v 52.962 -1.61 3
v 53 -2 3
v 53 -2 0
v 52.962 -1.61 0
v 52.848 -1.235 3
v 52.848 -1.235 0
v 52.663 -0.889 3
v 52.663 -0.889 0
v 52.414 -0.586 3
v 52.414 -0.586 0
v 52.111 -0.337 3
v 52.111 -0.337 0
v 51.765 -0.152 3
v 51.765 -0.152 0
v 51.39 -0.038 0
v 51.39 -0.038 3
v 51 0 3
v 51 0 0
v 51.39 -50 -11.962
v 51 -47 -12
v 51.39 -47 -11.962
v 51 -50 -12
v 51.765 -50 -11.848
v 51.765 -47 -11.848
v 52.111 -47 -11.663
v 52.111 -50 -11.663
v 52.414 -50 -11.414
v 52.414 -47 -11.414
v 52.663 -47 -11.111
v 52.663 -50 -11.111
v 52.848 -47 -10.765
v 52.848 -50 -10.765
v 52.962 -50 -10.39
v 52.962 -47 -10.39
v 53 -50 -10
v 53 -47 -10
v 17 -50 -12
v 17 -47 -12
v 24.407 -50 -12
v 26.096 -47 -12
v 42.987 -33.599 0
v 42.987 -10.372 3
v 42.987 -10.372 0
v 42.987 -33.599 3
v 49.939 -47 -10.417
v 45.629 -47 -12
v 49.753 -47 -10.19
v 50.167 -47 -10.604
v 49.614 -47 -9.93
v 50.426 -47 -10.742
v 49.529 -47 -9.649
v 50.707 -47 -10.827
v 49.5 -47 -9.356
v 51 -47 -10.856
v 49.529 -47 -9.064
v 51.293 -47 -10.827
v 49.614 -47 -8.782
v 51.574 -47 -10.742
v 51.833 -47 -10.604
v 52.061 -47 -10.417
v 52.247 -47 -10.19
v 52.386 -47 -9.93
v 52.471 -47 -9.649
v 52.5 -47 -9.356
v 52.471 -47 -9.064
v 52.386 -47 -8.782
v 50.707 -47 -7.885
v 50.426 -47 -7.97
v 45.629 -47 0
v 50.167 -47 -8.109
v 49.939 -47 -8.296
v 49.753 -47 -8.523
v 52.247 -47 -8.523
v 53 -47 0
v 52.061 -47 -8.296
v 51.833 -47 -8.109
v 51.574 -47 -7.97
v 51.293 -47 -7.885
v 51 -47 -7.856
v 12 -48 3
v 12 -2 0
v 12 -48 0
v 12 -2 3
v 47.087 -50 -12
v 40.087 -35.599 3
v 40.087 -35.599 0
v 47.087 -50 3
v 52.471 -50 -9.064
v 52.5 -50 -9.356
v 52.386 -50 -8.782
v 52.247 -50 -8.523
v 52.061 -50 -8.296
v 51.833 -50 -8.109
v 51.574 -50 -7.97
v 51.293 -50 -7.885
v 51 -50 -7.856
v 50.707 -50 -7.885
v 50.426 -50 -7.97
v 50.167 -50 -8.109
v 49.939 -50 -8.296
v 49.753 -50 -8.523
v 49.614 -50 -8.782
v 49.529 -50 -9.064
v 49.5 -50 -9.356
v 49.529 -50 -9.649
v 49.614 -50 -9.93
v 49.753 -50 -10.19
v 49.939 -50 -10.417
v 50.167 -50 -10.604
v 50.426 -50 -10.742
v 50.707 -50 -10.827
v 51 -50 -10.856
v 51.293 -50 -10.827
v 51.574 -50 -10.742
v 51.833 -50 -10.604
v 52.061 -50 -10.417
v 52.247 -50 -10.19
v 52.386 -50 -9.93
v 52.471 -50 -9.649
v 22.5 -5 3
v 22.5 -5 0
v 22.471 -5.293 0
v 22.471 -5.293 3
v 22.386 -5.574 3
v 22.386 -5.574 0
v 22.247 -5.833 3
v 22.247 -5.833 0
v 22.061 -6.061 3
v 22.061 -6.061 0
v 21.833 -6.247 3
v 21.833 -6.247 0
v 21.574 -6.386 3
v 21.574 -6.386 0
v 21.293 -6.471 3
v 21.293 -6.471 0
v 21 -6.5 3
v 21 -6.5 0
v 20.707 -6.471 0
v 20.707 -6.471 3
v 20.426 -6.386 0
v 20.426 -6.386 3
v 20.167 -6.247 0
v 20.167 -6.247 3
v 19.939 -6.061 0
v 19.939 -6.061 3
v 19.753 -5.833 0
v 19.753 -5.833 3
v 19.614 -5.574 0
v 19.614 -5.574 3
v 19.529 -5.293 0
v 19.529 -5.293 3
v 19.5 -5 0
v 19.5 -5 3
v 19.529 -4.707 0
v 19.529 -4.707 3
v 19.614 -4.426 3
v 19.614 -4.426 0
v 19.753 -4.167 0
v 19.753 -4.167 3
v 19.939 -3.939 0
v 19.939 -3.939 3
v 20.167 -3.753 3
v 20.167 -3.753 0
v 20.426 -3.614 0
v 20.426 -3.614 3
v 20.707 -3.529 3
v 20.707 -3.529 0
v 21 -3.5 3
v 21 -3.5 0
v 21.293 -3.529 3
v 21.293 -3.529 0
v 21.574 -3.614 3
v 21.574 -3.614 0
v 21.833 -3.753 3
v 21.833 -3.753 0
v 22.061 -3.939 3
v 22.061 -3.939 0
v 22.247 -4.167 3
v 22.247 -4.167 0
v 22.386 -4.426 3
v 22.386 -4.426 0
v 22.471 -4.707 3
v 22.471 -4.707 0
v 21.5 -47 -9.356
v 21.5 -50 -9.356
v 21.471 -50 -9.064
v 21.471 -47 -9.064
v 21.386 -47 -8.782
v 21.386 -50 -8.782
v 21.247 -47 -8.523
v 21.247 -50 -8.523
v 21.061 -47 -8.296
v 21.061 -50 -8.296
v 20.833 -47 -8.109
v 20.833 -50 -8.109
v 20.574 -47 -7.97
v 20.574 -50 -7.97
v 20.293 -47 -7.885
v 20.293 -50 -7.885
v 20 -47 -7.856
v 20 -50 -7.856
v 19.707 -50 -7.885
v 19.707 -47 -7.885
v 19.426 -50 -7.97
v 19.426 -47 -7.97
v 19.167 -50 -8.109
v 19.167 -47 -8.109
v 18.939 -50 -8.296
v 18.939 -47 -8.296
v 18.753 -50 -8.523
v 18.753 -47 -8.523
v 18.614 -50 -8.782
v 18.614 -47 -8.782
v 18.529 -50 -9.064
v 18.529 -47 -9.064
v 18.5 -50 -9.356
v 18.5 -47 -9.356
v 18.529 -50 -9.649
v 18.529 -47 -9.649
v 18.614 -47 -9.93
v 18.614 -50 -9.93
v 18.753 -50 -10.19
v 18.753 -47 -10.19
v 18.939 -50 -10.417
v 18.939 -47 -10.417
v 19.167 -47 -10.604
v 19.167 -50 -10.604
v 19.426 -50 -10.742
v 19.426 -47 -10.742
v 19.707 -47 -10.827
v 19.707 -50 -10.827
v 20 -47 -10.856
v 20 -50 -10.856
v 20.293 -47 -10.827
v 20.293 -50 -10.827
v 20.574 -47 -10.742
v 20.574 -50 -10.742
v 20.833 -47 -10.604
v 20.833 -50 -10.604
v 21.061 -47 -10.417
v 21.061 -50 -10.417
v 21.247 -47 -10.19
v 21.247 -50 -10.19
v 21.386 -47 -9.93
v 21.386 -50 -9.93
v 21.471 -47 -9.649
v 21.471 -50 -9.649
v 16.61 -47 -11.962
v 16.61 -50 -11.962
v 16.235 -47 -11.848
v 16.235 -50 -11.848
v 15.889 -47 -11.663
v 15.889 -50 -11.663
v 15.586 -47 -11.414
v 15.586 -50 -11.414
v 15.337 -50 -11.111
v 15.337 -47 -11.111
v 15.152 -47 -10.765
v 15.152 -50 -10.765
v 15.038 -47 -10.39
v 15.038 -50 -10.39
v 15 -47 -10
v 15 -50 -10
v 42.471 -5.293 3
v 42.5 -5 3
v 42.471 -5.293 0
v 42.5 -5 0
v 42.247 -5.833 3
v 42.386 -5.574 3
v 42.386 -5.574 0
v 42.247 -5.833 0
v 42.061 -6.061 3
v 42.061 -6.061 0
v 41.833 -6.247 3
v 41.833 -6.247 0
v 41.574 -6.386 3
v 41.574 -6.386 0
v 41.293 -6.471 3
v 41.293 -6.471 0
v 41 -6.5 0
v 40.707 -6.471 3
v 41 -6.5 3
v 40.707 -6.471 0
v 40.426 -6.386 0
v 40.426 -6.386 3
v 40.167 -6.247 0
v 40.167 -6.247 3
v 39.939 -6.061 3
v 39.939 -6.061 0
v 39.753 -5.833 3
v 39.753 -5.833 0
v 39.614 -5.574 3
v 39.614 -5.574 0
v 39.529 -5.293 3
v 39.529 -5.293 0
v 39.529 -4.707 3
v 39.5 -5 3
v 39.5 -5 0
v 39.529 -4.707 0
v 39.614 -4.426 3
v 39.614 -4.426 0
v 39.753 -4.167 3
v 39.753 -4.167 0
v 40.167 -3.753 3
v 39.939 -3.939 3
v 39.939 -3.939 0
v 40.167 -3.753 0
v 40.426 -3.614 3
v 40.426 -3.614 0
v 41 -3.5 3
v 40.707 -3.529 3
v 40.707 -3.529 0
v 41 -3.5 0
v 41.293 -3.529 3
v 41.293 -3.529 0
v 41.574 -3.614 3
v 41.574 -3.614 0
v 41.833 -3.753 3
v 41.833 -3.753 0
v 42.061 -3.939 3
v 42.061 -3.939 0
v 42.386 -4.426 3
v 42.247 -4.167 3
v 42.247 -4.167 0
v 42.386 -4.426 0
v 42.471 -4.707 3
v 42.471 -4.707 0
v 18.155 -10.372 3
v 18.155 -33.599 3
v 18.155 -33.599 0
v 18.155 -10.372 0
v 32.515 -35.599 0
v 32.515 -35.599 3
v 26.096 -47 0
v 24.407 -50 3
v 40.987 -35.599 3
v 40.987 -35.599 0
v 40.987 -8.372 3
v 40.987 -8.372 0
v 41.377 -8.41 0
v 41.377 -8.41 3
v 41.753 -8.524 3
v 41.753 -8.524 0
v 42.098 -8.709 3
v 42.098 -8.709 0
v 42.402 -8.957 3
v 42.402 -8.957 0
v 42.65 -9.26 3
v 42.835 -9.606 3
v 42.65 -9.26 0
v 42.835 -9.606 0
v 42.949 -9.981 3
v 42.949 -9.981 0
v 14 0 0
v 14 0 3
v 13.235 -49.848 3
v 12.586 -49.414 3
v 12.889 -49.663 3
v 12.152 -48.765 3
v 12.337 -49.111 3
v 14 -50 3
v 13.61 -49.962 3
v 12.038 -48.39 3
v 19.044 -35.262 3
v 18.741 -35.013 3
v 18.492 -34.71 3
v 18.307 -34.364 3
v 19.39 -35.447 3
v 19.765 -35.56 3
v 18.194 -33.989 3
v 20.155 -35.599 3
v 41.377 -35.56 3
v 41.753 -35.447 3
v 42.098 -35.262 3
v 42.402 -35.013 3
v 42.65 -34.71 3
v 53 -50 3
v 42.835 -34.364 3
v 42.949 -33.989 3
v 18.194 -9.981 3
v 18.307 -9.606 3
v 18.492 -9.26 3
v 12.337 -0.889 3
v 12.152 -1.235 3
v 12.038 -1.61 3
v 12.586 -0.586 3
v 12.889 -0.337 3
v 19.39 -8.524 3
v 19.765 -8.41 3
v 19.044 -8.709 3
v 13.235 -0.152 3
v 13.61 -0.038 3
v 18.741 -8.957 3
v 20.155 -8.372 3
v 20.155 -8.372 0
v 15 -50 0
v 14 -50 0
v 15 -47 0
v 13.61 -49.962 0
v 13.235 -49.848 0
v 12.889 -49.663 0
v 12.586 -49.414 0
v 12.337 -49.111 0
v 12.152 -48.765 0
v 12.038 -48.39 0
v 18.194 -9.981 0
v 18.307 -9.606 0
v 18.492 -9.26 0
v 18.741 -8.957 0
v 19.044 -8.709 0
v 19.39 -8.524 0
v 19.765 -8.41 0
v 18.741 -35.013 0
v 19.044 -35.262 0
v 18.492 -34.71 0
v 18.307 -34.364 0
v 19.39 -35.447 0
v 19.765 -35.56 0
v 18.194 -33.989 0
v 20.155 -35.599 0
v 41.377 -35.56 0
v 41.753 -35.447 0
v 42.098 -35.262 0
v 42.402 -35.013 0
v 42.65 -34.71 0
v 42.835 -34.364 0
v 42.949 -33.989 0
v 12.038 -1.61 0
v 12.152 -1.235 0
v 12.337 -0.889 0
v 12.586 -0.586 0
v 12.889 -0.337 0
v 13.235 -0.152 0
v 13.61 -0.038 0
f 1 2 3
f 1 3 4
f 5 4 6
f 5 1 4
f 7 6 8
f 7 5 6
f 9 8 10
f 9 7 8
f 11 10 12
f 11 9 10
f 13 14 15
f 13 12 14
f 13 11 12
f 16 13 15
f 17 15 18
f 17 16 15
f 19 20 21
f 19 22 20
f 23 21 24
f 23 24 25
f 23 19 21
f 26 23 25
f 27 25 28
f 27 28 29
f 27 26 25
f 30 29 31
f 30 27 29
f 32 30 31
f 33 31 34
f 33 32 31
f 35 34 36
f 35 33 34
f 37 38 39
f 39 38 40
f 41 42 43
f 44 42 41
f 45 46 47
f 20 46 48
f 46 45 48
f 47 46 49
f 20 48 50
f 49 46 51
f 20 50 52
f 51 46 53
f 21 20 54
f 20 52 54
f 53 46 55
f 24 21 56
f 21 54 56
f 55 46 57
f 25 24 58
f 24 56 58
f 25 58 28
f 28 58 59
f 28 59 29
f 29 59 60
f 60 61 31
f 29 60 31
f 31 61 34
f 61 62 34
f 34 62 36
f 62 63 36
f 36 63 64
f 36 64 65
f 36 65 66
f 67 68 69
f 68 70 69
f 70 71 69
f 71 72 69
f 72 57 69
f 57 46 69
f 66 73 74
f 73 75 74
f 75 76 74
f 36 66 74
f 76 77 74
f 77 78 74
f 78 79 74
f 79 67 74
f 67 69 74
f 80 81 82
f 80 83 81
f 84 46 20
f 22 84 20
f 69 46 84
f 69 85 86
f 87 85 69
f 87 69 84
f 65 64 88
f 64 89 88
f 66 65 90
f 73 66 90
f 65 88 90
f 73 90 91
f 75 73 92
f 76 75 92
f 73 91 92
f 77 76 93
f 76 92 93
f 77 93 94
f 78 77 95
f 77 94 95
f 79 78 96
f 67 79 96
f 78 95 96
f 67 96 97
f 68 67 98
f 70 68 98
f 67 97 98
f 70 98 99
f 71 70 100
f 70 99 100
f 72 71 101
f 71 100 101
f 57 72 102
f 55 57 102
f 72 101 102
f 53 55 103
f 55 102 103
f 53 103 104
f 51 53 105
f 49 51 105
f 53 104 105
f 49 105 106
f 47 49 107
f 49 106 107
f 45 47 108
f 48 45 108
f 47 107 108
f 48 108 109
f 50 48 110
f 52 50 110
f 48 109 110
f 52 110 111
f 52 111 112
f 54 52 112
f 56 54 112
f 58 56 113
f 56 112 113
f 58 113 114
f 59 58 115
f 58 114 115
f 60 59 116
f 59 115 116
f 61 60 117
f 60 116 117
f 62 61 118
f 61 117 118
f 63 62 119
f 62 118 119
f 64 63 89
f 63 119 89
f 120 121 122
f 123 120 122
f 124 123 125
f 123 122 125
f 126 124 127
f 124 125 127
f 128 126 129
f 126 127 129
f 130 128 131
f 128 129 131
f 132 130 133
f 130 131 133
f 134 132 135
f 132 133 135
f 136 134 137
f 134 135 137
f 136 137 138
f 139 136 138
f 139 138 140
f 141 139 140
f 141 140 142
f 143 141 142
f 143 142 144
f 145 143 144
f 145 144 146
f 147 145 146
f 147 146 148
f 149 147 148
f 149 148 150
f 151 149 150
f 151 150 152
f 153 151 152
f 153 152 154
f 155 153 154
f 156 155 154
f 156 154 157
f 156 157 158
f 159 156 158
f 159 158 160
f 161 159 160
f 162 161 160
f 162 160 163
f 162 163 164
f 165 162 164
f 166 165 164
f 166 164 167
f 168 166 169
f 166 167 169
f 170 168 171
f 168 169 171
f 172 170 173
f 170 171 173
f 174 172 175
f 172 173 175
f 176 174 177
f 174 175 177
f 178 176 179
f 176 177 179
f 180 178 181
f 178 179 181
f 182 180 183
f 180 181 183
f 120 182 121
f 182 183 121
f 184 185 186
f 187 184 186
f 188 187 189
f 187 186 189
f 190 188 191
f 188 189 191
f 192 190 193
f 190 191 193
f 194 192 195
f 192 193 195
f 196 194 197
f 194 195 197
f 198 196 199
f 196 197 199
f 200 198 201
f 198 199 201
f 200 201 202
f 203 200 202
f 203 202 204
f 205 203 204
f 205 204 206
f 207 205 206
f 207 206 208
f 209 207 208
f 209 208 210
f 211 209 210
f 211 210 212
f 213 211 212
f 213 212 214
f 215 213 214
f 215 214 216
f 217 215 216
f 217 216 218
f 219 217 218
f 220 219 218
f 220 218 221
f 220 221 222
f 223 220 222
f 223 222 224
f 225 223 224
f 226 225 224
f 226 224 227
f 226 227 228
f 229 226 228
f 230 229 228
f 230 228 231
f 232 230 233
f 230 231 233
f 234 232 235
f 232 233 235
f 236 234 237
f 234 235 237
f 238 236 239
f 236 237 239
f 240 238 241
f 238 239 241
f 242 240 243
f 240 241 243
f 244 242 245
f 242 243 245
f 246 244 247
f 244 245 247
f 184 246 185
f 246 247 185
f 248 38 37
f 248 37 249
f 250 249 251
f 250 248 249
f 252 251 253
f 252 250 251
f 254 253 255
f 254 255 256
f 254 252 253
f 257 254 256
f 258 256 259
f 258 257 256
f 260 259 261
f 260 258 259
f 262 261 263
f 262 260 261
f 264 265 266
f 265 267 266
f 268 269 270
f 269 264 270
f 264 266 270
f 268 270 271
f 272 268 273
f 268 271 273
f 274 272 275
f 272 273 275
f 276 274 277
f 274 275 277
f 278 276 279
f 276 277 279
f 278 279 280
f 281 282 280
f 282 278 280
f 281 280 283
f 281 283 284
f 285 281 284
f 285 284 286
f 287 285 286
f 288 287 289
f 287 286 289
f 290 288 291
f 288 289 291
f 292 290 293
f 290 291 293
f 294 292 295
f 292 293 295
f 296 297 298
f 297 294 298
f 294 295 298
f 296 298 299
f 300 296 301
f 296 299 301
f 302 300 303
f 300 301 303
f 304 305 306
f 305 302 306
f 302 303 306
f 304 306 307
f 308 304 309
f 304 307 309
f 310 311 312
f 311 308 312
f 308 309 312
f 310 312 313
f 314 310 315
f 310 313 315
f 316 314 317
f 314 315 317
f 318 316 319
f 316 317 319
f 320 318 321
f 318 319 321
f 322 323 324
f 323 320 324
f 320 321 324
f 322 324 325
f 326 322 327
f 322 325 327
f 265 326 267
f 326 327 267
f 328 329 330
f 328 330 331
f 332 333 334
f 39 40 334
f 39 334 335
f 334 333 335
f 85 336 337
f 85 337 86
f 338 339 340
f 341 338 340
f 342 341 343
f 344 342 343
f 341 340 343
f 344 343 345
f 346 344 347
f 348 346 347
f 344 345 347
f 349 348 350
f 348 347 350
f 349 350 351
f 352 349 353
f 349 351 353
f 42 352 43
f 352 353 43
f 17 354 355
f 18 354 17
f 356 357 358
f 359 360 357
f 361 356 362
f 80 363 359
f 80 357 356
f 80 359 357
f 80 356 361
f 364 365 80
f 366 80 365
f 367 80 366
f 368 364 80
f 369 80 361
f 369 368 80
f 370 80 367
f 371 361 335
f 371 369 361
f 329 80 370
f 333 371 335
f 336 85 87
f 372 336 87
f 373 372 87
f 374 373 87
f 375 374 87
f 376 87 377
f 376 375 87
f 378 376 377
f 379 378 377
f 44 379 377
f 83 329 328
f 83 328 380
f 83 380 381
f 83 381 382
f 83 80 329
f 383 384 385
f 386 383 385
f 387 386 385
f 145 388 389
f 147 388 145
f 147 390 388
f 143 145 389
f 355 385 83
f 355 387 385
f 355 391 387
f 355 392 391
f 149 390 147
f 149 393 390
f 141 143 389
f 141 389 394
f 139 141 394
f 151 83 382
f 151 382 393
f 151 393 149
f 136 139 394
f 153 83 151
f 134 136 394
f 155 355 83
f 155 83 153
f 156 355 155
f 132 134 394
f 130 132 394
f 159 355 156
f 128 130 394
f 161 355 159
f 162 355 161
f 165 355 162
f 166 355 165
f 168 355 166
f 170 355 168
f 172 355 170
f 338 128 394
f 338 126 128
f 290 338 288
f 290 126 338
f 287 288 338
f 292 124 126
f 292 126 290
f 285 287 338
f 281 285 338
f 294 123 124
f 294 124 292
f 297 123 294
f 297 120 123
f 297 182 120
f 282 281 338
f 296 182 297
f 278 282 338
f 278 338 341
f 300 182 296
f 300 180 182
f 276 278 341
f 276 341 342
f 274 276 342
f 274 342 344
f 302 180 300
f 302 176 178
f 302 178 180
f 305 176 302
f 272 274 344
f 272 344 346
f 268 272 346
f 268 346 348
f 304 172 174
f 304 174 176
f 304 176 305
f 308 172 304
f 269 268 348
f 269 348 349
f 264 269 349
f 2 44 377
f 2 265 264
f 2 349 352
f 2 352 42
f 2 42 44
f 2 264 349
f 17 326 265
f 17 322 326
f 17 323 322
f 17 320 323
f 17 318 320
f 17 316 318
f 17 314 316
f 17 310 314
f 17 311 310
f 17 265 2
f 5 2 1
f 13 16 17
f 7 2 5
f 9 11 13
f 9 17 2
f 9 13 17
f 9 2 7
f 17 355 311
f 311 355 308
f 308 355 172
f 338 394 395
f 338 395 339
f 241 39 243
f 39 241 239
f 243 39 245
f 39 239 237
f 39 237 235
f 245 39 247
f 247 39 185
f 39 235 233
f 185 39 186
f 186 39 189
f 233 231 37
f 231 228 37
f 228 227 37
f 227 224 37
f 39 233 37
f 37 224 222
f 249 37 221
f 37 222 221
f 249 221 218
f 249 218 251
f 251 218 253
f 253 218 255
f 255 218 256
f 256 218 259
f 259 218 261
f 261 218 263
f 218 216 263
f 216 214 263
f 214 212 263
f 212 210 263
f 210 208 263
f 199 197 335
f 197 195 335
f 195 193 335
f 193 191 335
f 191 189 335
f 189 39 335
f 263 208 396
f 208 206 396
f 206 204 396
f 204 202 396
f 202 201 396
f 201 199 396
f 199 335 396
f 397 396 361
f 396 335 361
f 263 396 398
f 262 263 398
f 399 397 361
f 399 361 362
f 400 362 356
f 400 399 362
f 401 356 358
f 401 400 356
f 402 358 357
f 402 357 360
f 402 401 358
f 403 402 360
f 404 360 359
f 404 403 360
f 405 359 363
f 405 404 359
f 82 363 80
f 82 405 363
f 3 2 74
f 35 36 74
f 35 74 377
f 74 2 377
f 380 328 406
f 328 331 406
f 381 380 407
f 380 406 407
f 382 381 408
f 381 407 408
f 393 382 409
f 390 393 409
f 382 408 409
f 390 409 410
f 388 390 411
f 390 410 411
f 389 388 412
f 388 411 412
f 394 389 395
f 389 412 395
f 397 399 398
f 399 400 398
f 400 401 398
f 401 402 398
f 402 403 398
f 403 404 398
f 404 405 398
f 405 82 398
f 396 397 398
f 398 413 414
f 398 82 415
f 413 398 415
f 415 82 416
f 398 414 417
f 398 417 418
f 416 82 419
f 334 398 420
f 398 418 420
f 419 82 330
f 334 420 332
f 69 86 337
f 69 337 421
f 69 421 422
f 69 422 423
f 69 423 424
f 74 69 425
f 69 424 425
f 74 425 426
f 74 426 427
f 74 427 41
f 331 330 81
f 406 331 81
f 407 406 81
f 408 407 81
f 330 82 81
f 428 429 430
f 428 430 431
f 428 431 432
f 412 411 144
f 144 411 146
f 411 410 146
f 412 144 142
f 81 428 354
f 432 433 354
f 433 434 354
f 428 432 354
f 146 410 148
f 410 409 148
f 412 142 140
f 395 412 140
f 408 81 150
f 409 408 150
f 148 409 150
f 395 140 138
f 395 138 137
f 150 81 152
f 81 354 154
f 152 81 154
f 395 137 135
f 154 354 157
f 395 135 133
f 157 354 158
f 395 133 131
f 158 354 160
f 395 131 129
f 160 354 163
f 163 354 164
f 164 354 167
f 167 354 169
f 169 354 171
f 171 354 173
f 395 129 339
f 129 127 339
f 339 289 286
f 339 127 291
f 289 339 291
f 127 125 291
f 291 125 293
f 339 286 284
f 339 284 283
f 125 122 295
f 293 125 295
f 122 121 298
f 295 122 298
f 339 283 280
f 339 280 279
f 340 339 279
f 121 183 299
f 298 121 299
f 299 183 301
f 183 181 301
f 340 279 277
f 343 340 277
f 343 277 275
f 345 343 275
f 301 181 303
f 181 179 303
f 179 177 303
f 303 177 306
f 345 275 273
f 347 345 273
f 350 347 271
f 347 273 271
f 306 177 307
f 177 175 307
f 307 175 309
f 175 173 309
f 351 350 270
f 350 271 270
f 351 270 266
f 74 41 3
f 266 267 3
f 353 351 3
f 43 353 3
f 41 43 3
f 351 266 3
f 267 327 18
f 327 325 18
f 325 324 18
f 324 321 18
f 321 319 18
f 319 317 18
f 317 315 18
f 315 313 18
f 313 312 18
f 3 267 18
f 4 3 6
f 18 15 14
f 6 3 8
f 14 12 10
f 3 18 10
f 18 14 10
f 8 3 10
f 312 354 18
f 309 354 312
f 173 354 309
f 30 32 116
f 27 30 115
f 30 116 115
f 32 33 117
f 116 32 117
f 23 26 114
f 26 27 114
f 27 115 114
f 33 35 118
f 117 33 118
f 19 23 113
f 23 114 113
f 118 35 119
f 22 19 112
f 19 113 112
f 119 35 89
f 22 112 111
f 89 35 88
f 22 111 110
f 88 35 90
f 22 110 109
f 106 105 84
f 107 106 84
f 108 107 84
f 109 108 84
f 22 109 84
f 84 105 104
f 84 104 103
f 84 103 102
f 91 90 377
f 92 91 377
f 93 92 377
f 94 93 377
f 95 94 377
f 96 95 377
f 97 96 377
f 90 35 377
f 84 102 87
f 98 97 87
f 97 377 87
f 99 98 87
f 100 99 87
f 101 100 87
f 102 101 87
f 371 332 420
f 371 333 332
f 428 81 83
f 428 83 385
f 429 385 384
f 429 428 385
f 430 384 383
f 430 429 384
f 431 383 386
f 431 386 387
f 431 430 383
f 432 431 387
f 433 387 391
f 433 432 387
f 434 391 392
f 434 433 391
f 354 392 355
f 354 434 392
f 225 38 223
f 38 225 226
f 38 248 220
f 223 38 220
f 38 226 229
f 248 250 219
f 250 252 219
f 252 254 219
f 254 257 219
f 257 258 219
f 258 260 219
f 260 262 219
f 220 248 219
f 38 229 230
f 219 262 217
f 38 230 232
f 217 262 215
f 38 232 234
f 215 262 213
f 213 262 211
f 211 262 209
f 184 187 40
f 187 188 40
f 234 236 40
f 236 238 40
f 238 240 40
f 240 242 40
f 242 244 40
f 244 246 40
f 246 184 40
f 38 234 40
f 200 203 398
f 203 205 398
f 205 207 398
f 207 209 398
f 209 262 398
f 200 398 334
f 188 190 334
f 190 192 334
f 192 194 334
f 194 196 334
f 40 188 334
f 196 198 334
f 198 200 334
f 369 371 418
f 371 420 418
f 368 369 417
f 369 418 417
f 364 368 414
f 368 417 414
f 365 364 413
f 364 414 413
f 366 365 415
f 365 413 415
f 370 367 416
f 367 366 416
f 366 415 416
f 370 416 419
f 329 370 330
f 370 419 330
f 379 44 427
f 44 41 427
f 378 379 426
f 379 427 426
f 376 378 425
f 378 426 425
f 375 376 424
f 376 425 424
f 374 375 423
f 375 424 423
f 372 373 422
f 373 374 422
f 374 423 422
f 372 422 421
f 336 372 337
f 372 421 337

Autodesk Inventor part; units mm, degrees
ref_plane "YZ Plane" through (0, 0, 0) normal (1, 0, 0) x (0, 1, 0)
ref_plane "XZ Plane" through (0, 0, 0) normal (0, 1, 0) x (-1, 0, 0)
ref_plane "XY Plane" through (0, 0, 0) normal (0, 0, 1) x (1, 0, 0)
sketch "Sketch1" plane through (0, 0, 0) normal (0, 0, 1) x (1, 0, 0)
  line L0 (0, 0) -> (53, 0)
  line L1 (53, 0) -> (53, -50)
  line L2 (53, -50) -> (0, -50)
  line L3 (0, -50) -> (0, 0)
  line L4 (41, 0) -> (41, 6.0159) construction
  line L5 (41, 6.0159) -> (41, -25.0024) construction
  circle A0 centre (41, -5) radius 1.5
  line L6 (41, 3.3654) -> (9, 3.3654) construction
  line L7 (9, 3.3654) -> (9, -23.8563) construction
  line L8 (41, -5) -> (7.1054, -5) construction
  circle A1 centre (9, -5) radius 1.5
  line L9 (41, -9) -> (21, -9) construction
  line L10 (21, -9) -> (21, -3) construction
  circle A2 centre (21, -5) radius 1.5
  dimension "d0" = 53
  dimension "d1" = 50
  dimension "d2" = 3
  dimension "d3" = 32
  dimension "d4" = 3
  dimension "d87" = 20
  dimension "d88" = 3
extrude "Extrusion1" add sketch "Sketch1" along normal blind 3 contours L0 L1 L2 L3 | A2
sketch "Sketch2" plane through (0, 0, 3) normal (0, 0, 1) x (1, 0, 0)
  line L0 (53, -50) -> (15, -50)
  line L1 (15, -50) -> (15, -47)
  line L2 (15, -47) -> (53, -47)
  line L3 (53, -47) -> (53, -50)
  dimension "d7" = 38
  dimension "d8" = 3
extrude "Extrusion2" add sketch "Sketch2" against normal blind 15
fillet "Fillet3" radius 2 1 edges at (53, -48.5, -12)
fillet "Fillet6" radius 2 1 edges at (15, -48.5, -12)
sketch "Sketch5" plane through (0, 0, 3) normal (0, 0, 1) x (1, 0, 0)
  line L0 (18.1552, -8.3715) -> (42.9873, -8.3715)
  line L1 (42.9873, -8.3715) -> (42.9873, -35.5989)
  line L2 (42.9873, -35.5989) -> (18.1552, -35.5989)
  line L3 (18.1552, -35.5989) -> (18.1552, -8.3715)
extrude "Extrusion4" cut sketch "Sketch5" against normal through all
fillet "Fillet8" radius 2 1 edges at (18.1552, -8.3715, 1.5)
fillet "Fillet9" radius 2 1 edges at (42.9873, -8.3715, 1.5)
fillet "Fillet10" radius 2 1 edges at (18.1552, -35.5989, 1.5)
fillet "Fillet12" radius 2 1 edges at (42.9873, -35.5989, 1.5)
fillet "Fillet13" radius 2 1 edges at (0, 0, 1.5)
fillet "Fillet14" radius 2 1 edges at (53, 0, 1.5)
sketch "Sketch6" plane through (0, -50, 3) normal (0, -1, 0) x (1, 0, 0)
  line L0 (51, -15) -> (17, -15) projected
  line L1 (0, 0) -> (53, 0) projected
  line L2 (53, 0) -> (51, 0) construction
  line L3 (51, 2) -> (51, -15) construction
  line L4 (54, -12.3563) -> (12.4146, -12.3563) construction
  line L5 (51, -7.4819) -> (20, -7.4819) construction
  line L6 (20, -7.4819) -> (20, -11) construction
  circle A0 centre (20, -12.3563) radius 1.5
  circle A1 centre (51, -12.3563) radius 1.5
  dimension "d60" = 31
  dimension "d61" = 3
  dimension "d64" = 3
extrude "Extrusion5" cut sketch "Sketch6" against normal through all contours A0
extrude "Extrusion6" cut sketch "Sketch6" against normal through all contours A1
sketch "Sketch7" plane through (0, 0, 3) normal (0, 0, 1) x (1, 0, 0)
  line L0 (40.9873, -35.5989) -> (20.1552, -35.5989) projected
  line L1 (0, -50) -> (53, -50) projected
  line L2 (32.5151, -35.5989) -> (24.407, -50)
  line L3 (40.0869, -35.5989) -> (47.0869, -50)
  point P0 (0, 0)
extrude "Extrusion7" cut sketch "Sketch7" against normal through all
sketch "Sketch8" plane through (0, 0, 3) normal (0, 0, 1) x (1, 0, 0)
  line L0 (0, -50) -> (24.407, -50) projected
  circle A0 centre (9, -5) radius 1.5 projected
  line L1 (0, 0) -> (12, 0)
  line L2 (12, 0) -> (12, -50)
  line L3 (12, -50) -> (0, -50)
  line L4 (0, -50) -> (0, 0)
extrude "Extrusion8" cut sketch "Sketch8" against normal through all
fillet "Fillet15" radius 2 1 edges at (12, -50, 1.5)
fillet "Fillet16" radius 2 1 edges at (12, 0, 1.5)
hole "Hole4" at (20, -50, -9.3563) direction (0, 1, 0) diameter 3 end through all
hole "Hole5" at (20, -50, -9.3563) direction (0, 1, 0) diameter 3 end through all
extrude "Extrusion9" cut sketch "Sketch1" along normal through all contours A2
properties part number "bart z endstop bracket v4"
